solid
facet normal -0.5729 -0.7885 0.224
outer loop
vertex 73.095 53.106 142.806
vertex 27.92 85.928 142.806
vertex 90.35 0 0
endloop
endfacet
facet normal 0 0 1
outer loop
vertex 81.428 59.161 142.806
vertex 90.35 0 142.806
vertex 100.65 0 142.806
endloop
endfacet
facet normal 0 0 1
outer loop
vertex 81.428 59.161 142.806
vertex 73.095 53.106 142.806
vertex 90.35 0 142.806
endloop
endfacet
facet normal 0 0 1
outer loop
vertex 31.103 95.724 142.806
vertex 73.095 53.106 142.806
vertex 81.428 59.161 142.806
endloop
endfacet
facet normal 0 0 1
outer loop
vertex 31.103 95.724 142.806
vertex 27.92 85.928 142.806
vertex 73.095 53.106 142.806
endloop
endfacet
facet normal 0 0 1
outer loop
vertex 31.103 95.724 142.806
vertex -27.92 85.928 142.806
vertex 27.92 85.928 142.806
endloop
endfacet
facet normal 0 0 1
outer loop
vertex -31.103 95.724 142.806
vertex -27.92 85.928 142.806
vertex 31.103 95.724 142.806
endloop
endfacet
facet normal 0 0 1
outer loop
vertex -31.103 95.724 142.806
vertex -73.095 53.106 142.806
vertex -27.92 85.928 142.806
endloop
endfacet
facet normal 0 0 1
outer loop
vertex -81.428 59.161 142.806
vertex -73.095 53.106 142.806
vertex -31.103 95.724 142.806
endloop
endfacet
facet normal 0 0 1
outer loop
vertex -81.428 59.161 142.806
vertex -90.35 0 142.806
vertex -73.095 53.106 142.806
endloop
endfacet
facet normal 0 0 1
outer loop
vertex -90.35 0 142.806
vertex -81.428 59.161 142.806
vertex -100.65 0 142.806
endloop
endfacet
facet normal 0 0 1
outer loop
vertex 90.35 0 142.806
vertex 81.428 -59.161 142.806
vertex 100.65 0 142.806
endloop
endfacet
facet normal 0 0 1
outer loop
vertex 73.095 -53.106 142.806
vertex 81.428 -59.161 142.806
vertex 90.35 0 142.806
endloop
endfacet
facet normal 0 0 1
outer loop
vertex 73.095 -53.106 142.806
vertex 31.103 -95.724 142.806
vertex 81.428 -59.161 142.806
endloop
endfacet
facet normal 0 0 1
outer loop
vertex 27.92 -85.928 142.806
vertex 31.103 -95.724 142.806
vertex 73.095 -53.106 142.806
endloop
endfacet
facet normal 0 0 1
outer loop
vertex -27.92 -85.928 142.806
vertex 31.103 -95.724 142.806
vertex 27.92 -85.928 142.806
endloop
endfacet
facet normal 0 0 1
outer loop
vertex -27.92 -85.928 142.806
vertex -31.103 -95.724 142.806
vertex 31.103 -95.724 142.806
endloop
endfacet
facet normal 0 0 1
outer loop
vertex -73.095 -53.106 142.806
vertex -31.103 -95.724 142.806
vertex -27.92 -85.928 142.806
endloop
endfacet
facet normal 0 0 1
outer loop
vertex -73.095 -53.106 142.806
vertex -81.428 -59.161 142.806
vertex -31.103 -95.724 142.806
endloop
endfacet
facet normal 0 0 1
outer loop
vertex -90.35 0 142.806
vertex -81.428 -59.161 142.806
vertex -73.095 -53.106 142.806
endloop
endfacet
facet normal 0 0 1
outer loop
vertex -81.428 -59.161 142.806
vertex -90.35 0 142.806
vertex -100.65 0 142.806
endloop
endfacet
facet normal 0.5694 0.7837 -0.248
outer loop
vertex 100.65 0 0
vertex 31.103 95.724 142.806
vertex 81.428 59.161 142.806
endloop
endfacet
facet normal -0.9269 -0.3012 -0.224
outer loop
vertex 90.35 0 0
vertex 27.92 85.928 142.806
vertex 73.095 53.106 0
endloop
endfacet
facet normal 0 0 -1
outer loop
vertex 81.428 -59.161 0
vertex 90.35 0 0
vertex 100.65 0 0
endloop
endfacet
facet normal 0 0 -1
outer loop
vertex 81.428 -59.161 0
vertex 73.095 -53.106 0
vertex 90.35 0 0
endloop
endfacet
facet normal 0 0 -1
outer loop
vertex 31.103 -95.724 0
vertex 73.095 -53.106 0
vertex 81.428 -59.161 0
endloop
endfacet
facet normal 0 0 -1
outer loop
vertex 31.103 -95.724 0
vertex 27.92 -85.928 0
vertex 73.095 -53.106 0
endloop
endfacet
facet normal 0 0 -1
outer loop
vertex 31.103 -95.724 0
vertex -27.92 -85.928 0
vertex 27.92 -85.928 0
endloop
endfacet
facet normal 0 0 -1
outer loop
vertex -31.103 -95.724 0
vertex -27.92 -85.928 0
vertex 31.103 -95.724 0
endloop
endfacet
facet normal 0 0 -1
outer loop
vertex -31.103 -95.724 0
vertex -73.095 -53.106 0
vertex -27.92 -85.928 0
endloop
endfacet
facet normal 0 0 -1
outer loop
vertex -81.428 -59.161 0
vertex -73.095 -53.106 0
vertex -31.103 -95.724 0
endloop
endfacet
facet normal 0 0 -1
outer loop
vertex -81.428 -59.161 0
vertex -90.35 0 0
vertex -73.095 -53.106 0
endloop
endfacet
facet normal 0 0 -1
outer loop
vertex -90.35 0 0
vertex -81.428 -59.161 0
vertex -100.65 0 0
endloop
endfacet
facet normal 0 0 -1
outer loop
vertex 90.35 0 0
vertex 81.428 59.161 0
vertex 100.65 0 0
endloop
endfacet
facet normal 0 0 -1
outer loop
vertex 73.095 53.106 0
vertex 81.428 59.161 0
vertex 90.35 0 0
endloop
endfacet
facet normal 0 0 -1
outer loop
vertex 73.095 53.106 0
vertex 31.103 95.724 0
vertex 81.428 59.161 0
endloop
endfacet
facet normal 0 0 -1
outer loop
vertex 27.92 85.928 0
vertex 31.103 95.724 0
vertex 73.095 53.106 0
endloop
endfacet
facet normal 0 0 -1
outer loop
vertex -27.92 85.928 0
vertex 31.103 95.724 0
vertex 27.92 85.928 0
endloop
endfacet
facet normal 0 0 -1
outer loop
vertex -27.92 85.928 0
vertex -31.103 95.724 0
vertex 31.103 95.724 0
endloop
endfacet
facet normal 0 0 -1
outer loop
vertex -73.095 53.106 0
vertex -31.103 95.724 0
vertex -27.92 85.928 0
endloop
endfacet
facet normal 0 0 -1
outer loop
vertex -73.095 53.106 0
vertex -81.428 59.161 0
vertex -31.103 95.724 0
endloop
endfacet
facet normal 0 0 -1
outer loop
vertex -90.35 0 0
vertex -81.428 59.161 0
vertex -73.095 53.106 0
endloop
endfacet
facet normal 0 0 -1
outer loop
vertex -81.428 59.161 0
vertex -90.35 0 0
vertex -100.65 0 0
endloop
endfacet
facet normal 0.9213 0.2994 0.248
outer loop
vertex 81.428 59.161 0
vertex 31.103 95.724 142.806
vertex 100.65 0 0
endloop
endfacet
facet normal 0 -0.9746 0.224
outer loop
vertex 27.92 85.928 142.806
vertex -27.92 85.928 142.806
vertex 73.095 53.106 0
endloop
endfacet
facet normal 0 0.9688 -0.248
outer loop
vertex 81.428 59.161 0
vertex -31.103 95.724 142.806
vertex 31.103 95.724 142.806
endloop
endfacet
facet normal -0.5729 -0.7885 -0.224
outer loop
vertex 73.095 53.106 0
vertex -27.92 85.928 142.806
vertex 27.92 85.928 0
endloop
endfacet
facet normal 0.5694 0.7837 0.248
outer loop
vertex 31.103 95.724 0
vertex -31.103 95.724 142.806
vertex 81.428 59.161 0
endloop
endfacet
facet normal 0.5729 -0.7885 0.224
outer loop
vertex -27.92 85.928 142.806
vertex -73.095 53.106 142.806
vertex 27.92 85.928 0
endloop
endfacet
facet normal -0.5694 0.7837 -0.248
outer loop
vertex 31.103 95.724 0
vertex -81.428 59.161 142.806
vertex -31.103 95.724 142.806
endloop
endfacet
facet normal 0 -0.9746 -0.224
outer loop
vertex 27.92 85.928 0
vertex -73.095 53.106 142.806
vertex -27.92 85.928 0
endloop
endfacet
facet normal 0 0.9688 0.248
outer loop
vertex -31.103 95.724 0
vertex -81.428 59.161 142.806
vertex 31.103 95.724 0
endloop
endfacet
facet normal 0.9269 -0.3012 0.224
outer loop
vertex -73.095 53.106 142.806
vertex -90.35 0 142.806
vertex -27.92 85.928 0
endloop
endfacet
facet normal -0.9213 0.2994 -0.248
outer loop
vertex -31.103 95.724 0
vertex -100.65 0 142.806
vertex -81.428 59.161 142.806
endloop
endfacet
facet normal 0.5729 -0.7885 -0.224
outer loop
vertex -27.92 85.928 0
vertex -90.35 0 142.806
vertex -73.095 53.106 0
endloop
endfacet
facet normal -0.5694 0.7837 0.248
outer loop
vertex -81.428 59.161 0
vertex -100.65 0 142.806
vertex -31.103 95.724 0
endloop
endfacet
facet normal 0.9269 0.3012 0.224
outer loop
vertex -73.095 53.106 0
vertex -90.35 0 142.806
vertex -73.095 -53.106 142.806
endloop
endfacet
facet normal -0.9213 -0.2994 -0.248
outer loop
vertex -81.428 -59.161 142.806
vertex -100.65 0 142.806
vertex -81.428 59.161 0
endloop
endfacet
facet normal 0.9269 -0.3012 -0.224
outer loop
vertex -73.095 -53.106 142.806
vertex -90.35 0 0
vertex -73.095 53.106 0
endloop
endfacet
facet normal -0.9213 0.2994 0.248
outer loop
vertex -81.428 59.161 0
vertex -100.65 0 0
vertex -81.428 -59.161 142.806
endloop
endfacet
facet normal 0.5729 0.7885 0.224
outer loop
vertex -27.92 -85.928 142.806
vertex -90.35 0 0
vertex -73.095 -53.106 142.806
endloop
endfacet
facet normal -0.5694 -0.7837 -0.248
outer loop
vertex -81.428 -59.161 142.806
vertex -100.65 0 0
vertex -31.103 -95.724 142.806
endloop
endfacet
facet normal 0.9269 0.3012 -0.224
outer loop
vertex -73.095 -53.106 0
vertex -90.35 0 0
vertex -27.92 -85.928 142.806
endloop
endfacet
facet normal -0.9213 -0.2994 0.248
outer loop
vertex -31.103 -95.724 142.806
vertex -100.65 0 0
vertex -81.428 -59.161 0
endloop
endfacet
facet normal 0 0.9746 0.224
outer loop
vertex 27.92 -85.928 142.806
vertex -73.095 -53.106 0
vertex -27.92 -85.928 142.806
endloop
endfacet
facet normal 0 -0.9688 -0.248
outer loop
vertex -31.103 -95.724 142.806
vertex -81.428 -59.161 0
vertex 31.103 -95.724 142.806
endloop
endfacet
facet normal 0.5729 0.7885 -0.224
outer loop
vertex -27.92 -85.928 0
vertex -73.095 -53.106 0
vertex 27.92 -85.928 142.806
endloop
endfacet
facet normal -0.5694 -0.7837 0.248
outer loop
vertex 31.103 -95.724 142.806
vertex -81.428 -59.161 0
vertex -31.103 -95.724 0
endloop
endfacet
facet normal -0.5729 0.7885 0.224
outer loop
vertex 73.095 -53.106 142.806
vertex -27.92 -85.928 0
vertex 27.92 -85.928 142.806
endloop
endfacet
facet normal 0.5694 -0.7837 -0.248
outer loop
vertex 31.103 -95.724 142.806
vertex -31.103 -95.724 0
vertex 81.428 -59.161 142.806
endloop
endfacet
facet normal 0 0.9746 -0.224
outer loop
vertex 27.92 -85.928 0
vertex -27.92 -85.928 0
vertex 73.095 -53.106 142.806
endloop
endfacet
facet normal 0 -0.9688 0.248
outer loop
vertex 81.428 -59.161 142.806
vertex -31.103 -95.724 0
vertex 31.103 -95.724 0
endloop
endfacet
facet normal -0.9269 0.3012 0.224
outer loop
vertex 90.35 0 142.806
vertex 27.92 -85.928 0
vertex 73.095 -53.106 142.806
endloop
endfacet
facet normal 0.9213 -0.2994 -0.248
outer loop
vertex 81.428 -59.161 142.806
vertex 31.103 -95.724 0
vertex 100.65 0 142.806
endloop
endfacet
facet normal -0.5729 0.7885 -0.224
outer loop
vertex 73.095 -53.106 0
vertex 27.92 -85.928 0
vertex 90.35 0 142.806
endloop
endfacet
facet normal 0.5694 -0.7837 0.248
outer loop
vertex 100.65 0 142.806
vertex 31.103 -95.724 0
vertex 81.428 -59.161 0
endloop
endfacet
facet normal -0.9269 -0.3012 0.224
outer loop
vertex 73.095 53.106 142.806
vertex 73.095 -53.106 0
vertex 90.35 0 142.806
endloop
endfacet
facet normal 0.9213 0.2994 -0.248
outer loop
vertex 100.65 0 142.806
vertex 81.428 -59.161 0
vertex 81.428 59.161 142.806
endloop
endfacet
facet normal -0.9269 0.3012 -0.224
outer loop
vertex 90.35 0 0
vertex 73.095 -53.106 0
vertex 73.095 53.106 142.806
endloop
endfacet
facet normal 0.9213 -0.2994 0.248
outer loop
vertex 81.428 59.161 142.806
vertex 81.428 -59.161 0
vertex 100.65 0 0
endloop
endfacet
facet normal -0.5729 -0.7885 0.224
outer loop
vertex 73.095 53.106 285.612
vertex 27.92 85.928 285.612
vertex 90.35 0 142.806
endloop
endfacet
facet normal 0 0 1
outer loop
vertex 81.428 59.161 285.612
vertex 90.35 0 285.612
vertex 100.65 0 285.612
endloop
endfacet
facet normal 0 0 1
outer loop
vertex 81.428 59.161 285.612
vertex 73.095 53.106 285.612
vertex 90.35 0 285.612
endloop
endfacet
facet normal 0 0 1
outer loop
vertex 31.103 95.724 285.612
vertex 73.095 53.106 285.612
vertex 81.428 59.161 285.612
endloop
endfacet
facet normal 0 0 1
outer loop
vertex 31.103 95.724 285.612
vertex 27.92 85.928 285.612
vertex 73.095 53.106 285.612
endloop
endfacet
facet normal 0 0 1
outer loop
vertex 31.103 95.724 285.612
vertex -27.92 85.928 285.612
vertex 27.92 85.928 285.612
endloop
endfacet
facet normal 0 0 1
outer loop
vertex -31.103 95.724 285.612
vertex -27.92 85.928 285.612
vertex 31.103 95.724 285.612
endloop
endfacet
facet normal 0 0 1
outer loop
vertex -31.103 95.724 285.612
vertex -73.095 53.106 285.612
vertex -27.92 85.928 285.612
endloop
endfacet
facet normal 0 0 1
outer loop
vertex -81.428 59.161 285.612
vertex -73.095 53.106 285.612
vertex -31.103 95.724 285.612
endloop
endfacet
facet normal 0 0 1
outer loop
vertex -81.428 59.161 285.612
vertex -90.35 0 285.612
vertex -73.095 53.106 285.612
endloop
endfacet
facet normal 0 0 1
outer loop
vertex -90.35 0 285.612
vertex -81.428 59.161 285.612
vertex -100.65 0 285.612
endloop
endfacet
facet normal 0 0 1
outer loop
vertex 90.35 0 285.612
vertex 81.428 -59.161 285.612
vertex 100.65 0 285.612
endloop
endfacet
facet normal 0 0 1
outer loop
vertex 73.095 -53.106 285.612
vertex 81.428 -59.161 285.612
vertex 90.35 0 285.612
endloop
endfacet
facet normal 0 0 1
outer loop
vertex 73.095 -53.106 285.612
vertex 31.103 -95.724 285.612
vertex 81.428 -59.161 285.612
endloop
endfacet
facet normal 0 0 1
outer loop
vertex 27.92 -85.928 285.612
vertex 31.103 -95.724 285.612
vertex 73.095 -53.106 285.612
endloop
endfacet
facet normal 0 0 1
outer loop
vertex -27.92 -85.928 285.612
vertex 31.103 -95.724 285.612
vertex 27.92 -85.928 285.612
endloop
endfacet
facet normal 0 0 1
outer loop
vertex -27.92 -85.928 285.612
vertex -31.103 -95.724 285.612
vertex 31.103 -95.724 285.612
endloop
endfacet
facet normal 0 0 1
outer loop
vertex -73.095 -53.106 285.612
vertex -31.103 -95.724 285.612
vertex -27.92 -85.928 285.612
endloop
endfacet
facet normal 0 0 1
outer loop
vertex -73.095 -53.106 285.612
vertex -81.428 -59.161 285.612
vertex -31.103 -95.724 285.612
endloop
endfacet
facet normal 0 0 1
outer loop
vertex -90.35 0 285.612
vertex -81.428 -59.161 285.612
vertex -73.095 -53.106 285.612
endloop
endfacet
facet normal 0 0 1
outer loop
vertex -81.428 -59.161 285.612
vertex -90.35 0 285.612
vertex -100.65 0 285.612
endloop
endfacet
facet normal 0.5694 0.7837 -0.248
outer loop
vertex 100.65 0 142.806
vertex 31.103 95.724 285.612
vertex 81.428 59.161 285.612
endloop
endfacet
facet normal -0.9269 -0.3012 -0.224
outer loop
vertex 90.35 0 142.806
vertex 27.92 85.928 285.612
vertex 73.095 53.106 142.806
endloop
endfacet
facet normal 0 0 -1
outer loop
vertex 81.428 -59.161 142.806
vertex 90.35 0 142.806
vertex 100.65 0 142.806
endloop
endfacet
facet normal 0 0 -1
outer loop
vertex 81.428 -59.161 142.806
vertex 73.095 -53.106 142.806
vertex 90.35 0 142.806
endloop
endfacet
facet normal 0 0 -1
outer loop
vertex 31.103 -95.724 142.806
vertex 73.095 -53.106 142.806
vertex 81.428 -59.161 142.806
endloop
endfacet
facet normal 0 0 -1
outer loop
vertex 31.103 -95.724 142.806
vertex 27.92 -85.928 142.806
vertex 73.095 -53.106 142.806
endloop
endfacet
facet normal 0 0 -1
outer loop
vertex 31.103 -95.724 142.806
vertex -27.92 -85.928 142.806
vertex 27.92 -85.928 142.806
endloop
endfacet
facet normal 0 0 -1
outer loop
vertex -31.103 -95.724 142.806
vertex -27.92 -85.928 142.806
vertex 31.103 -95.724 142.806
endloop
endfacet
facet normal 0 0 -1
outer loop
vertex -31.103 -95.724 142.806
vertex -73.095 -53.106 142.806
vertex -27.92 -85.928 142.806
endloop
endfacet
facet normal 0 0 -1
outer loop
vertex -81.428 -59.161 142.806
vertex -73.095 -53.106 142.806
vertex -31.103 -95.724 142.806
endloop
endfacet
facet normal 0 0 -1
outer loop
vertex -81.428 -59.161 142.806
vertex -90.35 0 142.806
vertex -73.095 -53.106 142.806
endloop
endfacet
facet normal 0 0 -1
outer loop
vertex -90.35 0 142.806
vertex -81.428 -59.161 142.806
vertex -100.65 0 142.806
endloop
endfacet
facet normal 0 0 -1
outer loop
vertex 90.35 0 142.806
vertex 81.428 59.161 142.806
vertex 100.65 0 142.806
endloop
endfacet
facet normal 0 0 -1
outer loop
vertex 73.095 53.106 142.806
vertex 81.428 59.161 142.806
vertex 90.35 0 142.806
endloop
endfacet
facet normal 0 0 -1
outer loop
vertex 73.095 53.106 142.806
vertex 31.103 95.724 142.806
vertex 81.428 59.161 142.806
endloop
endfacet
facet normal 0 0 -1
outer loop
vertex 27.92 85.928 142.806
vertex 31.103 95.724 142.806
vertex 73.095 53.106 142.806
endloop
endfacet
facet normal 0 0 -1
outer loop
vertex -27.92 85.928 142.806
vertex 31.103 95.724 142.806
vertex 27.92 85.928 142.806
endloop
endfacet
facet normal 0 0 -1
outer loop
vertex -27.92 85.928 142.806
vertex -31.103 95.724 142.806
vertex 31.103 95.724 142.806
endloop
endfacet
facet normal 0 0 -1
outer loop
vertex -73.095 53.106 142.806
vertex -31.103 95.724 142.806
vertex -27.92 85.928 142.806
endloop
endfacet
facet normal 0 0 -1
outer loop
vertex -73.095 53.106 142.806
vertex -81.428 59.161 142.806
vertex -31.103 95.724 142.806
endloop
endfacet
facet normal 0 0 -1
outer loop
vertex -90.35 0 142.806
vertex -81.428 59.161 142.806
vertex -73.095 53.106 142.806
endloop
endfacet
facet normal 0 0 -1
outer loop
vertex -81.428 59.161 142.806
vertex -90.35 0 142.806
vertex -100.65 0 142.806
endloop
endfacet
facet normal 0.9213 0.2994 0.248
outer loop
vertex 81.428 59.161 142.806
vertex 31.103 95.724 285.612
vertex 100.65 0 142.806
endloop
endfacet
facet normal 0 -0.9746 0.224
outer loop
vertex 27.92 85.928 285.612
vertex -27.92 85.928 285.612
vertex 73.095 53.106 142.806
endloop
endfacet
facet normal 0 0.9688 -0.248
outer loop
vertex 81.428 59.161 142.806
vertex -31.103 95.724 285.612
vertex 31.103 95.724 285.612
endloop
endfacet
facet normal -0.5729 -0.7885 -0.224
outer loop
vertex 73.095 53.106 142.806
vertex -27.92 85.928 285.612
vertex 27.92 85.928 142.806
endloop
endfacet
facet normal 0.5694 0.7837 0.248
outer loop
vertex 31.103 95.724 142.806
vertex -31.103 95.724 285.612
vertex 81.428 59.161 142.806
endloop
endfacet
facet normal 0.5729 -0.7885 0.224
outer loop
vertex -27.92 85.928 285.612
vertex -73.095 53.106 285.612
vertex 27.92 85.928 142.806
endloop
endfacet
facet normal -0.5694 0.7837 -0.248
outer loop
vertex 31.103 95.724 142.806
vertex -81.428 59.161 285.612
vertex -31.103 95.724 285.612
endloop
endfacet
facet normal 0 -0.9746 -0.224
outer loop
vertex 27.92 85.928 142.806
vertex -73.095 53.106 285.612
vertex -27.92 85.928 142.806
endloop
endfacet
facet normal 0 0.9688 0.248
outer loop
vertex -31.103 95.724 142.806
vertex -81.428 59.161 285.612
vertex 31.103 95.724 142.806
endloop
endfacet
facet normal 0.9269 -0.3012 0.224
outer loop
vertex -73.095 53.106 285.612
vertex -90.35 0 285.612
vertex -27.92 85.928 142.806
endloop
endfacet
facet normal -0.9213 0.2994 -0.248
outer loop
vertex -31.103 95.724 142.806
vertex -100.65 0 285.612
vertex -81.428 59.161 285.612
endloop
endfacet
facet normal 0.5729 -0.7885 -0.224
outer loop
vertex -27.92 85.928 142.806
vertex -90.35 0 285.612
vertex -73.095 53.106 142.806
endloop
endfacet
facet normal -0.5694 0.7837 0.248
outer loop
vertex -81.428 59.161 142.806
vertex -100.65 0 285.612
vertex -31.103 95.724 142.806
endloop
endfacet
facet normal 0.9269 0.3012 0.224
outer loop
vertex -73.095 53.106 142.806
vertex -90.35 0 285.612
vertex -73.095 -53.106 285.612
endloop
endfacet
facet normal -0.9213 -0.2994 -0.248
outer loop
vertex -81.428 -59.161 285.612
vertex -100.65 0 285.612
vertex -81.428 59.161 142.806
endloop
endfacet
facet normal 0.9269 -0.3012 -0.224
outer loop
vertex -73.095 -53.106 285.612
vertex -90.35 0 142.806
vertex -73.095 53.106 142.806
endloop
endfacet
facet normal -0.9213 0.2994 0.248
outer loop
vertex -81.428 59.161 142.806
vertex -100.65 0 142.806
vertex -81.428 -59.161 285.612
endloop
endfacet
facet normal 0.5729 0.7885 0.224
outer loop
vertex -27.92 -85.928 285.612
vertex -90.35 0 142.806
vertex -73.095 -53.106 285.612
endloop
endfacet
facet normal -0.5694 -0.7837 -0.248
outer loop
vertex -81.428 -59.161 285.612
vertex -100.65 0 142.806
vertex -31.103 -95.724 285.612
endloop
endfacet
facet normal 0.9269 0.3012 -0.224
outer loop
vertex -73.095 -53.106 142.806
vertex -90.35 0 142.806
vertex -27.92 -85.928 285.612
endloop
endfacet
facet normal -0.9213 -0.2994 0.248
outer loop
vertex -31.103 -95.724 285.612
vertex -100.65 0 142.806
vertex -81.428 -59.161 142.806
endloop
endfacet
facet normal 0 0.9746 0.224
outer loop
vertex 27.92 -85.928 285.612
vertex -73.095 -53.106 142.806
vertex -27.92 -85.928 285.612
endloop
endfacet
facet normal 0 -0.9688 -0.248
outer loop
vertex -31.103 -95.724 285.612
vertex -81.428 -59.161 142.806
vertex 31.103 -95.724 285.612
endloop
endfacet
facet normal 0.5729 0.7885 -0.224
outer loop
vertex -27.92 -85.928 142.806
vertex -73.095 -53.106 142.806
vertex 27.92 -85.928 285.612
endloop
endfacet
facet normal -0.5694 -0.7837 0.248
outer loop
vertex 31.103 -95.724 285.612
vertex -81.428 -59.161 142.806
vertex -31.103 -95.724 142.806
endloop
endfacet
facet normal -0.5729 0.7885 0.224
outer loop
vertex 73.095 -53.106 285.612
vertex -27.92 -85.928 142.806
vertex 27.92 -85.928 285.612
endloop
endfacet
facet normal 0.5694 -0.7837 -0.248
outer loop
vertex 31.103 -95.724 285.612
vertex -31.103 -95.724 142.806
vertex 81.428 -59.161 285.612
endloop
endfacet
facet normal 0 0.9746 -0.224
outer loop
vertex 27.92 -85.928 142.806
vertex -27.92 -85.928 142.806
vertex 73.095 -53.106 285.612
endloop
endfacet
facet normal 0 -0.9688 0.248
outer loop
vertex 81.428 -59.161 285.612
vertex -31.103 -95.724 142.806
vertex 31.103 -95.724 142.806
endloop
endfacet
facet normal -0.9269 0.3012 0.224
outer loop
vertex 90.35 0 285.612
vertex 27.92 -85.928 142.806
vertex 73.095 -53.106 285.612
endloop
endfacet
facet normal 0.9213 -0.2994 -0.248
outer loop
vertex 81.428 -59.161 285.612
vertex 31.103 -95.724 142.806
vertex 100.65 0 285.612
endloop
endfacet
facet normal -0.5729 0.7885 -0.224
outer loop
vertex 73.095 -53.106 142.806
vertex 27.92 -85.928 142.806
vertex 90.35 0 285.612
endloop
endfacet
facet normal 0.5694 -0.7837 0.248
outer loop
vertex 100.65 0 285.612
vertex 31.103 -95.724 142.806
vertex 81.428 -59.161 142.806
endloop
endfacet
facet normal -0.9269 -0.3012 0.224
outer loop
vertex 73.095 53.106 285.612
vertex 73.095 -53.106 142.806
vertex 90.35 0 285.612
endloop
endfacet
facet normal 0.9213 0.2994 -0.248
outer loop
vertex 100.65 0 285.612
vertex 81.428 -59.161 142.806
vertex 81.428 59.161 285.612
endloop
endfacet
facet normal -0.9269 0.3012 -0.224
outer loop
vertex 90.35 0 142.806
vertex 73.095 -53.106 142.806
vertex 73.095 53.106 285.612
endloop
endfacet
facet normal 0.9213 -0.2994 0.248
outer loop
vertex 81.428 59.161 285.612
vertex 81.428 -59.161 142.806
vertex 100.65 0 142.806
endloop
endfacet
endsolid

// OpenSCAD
// file: Kresling.scad
function kresling_point(R,n,z=0,i=0,angle=0) =
    [R*cos(360*i/n + angle),R*sin(360*i/n + angle),z];

function facet_a_points(R,n,z,i,alpha) = 
    [kresling_point(R,n,z=0,i=i,angle=0),
     kresling_point(R,n,z=z,i=i+1,angle=alpha),
     kresling_point(R,n,z=z,i=i+2,angle=alpha)];

function facet_b_points(R,n,z,i,alpha) = 
    [kresling_point(R,n,z=0,i=i,angle=0),
     kresling_point(R,n,z=0,i=i+1,angle=0),
     kresling_point(R,n,z=z,i=i+2,angle=alpha)];
     
module draw_facet(F){
    polyhedron(points=[F[0],F[1],F[2],F[0],F[1],F[2]],
           faces = [[1,3,2],
                    [4,6,5],
                    [1,3,6,4],
                    [1,2,5,4],
                    [2,3,6,5]]);};

module draw_kresling_tower(R,n,z,alpha,thickness=0.3,no_of_cells=1,test=false){
    
    for (cell=[1:no_of_cells]){
        rotate([0, 0, alpha*(cell-1)]) translate([0,0,z*(cell-1)])
        for (i=[0:test ? 0 : n-1]){
           hull(){
                draw_facet(facet_a_points(R-thickness/2,n,z,i,alpha));
                draw_facet(facet_a_points(R+thickness/2,n,z,i,alpha));
           };
           if(!test){
               hull(){
                    draw_facet(facet_b_points(R-thickness/2,n,z,i,alpha));
                    draw_facet(facet_b_points(R+thickness/2,n,z,i,alpha));
               };};
        };
    };
}
// main file
include <Kresling.scad>

// how to set up animation:
// Select "View -> Animate"
// "Time" will vary from 0 to 1. Set FPS and Steps to change
// How the animation goes

// Input parameters
R = 95.5; // Radius
n = 10;    // Number of sides
lambda = 0.5;

max_angle = 67;
alpha = $t*max_angle;// measured angle                                    
theta = 90 * (1-2/n);
l = 2*R*cos(theta*(1-lambda));

// considering constant l
z = sqrt(l*l - 2*R*R*(1 - cos(360/n + alpha)));                    

// draw tower
draw_kresling_tower(R,n,z,alpha,thickness = 10.3, no_of_cells=2);
